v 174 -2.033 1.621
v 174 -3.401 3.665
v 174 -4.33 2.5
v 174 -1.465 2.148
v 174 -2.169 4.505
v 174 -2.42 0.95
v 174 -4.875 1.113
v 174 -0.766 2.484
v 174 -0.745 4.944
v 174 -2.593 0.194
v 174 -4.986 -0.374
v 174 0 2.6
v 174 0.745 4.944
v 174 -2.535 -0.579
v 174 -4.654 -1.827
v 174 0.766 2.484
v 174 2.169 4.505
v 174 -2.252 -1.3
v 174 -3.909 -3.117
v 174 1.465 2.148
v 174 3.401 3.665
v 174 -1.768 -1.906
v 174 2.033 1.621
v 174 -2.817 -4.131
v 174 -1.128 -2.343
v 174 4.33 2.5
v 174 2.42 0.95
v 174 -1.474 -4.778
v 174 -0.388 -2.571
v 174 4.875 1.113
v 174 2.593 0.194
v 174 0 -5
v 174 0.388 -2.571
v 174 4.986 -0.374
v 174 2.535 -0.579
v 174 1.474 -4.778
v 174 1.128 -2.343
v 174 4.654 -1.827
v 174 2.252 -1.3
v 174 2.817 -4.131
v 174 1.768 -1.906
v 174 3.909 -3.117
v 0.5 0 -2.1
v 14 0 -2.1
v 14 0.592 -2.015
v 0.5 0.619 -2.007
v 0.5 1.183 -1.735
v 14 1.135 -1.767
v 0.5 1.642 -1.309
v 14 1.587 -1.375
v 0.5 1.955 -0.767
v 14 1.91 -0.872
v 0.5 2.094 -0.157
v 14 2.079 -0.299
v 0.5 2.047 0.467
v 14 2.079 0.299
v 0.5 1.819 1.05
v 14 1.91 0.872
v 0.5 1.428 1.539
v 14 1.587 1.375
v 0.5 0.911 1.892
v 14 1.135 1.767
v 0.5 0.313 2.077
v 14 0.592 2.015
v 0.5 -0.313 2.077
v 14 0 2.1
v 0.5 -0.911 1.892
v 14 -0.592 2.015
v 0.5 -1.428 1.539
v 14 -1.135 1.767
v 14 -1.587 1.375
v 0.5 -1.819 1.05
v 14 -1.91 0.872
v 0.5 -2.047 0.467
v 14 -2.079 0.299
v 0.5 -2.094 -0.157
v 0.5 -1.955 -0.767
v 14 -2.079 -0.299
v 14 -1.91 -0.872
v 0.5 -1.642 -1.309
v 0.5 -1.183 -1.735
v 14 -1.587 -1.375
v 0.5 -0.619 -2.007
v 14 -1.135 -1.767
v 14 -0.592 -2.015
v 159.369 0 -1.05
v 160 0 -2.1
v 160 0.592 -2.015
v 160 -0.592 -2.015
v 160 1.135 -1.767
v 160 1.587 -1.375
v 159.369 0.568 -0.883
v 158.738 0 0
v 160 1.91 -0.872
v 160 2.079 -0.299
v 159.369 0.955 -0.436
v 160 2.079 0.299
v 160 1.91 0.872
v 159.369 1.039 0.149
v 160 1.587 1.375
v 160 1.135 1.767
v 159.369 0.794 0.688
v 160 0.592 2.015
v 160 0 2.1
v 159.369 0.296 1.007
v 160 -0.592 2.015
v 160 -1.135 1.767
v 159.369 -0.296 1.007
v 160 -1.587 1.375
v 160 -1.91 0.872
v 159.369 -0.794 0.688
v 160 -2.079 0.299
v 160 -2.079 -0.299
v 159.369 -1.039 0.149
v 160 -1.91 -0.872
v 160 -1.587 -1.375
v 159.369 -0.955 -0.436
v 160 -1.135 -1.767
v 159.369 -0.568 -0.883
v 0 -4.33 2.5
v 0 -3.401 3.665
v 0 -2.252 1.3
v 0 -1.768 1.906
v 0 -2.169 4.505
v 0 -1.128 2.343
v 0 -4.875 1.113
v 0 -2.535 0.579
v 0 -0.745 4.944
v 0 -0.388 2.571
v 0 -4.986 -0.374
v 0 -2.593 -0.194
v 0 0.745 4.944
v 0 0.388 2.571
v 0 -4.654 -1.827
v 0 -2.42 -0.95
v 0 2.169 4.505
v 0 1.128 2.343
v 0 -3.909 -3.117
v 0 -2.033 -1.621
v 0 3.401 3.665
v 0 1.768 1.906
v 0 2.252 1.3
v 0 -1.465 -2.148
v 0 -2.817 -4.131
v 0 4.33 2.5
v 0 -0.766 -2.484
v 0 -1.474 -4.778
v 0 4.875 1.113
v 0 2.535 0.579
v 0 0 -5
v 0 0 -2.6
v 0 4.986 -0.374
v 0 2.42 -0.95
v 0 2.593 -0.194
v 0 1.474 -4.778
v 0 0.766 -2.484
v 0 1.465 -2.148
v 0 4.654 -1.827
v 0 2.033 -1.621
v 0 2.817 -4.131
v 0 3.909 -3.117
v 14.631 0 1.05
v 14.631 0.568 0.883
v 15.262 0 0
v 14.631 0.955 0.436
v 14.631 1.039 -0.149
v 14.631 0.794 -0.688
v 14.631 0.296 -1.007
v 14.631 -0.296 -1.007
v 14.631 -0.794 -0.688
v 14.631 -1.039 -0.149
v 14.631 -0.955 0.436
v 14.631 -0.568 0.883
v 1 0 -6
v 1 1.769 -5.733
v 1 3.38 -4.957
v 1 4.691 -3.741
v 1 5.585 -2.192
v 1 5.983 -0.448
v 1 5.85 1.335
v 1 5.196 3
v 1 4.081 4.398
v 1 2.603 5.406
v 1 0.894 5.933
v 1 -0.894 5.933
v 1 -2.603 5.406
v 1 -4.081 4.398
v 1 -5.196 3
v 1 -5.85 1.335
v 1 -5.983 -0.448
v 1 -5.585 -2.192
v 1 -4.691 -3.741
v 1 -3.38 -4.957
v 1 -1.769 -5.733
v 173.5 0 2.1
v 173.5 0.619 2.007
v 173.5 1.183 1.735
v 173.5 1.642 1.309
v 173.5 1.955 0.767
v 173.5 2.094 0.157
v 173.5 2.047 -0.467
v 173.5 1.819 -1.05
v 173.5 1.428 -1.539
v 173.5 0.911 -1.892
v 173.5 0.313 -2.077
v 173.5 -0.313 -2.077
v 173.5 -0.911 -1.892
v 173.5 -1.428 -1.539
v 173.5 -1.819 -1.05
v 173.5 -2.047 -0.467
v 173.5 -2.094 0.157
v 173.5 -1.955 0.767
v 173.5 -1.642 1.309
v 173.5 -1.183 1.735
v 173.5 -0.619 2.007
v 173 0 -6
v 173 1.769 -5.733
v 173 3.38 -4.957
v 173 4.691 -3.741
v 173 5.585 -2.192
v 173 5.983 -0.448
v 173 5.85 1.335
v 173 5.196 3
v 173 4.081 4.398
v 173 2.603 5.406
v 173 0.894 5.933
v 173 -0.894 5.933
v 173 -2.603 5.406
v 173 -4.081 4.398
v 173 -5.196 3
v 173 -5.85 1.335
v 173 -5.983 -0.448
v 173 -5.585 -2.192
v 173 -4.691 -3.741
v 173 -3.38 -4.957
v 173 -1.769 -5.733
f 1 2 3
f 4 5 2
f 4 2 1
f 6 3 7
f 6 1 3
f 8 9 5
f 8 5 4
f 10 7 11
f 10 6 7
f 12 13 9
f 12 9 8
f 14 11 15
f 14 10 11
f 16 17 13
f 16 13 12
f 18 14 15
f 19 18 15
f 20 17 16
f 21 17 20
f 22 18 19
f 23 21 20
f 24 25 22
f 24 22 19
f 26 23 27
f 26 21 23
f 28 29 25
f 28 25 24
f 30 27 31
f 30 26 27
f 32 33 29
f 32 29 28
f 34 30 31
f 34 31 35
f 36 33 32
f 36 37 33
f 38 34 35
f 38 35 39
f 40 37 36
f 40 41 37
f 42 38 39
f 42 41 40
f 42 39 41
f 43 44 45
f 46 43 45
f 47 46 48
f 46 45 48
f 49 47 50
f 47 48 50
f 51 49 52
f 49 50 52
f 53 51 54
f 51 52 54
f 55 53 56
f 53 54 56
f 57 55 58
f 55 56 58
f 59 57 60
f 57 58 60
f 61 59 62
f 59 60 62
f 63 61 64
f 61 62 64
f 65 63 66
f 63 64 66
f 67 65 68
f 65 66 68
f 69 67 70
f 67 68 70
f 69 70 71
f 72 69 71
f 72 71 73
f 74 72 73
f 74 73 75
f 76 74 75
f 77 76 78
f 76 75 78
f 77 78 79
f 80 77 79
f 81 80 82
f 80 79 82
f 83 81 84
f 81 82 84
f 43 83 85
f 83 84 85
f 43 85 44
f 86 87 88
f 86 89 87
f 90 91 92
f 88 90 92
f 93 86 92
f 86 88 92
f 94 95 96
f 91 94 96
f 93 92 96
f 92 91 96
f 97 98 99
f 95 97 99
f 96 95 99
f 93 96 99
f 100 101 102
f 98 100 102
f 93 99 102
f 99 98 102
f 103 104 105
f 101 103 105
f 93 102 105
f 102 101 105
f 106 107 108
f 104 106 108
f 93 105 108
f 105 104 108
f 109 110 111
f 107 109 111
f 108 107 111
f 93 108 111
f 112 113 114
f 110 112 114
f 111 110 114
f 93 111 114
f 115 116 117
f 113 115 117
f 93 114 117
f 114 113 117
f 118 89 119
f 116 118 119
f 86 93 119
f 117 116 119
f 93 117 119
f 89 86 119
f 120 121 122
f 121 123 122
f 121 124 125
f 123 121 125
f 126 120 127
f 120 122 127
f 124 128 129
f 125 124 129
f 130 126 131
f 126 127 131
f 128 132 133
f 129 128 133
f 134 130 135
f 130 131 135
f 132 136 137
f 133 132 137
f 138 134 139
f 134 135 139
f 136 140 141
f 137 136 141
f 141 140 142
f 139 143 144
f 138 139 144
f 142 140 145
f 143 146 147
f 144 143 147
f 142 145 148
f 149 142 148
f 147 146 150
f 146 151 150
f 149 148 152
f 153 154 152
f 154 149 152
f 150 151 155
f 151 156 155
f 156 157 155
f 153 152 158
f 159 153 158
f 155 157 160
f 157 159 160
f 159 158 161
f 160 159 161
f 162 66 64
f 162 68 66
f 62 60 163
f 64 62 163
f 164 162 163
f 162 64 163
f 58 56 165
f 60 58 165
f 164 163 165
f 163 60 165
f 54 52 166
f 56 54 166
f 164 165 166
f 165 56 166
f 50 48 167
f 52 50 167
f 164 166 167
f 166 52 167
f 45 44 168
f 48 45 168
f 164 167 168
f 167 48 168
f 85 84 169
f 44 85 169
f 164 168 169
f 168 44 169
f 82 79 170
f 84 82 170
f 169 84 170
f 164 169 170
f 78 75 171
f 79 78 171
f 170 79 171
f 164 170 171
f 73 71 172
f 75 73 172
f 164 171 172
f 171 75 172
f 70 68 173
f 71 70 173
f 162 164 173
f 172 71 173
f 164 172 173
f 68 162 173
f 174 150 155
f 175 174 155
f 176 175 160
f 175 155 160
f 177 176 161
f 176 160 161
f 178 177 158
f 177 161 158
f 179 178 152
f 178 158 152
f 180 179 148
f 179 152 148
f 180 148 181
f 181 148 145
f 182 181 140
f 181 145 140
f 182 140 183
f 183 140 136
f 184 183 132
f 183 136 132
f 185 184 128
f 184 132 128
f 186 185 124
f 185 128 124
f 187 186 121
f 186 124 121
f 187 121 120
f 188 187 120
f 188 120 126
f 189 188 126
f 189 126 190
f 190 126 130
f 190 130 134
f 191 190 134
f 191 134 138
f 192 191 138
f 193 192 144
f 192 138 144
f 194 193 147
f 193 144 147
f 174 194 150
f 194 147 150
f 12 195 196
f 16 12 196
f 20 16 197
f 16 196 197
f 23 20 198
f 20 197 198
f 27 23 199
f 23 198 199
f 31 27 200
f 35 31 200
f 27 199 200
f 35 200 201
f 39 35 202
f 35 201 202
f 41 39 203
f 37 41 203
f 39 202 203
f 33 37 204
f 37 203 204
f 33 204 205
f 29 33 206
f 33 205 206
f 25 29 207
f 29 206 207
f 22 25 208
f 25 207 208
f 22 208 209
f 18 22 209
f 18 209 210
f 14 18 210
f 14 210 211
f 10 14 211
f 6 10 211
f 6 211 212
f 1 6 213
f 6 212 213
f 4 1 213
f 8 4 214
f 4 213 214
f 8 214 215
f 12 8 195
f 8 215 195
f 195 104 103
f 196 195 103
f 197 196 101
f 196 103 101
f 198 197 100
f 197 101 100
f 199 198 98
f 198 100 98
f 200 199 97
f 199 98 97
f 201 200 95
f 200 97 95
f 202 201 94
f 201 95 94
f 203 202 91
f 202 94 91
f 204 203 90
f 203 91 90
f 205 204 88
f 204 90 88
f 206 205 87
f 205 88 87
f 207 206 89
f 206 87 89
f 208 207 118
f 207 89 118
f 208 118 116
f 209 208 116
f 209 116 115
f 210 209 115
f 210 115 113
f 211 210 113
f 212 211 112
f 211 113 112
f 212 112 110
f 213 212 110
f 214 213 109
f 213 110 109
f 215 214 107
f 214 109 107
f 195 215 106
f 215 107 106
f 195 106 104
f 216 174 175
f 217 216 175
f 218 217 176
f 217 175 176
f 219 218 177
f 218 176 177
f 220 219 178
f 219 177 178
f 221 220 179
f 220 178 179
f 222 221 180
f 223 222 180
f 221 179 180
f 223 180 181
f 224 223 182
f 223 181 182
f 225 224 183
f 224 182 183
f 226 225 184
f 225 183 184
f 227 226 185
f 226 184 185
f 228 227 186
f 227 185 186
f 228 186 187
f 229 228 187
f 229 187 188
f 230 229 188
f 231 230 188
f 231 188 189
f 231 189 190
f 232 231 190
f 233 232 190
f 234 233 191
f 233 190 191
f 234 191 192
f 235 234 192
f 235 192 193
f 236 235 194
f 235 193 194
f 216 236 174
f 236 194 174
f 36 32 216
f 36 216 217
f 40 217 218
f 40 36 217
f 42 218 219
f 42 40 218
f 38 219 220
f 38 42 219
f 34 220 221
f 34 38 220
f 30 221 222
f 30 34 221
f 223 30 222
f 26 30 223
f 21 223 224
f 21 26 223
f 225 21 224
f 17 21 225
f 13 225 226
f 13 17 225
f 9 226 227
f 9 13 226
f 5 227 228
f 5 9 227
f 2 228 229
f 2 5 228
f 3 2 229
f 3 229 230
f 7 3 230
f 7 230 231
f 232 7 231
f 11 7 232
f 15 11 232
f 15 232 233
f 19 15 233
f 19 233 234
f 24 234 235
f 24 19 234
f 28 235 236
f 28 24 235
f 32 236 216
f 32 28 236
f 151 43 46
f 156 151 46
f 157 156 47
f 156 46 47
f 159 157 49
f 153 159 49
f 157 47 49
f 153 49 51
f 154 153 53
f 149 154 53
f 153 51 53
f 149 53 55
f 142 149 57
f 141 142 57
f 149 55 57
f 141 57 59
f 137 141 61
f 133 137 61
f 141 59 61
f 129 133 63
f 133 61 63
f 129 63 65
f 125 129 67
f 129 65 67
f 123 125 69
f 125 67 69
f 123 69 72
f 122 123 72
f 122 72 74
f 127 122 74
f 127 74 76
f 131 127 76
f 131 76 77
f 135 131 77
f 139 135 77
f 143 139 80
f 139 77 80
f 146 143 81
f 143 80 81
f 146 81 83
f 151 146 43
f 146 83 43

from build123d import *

# Parameters (mm, degrees)
SKETCH1_R             = 6
BOSS_EXTRUDE1_DEPTH   = 174
CHAMFER1_SIZE         = 1
M5_TAPPED_HOLE1_D     = 4.2
M5_TAPPED_HOLE1_DEPTH = 14
M5_TAPPED_HOLE1_TIP   = 1.2618073
CHAMFER2_SIZE         = 0.5
M5_TAPPED_HOLE2_D     = 4.2
M5_TAPPED_HOLE2_DEPTH = 14
M5_TAPPED_HOLE2_TIP   = 1.2618073
CHAMFER3_SIZE         = 0.5


with BuildPart() as part:
    # Sketch1 → Boss-Extrude1 (new body)
    with BuildSketch(Plane(origin=(0, 0, 0), x_dir=(0, 0, -1), z_dir=(1, 0, 0))):
        Circle(SKETCH1_R)
    extrude(amount=BOSS_EXTRUDE1_DEPTH)

    # Chamfer1
    chamfer1_edges = [part.edges().sort_by_distance(p)[0] for p in [
        (0, 0, 6),
        (174, 0, 6),
    ]]
    chamfer(chamfer1_edges, length=CHAMFER1_SIZE)

    # M5 Tapped Hole1
    with Locations(Plane(origin=(174, 0, 0), x_dir=(0, 0, -1), z_dir=(1, 0, 0))):
        with Locations((0, 0)):
            Hole(M5_TAPPED_HOLE1_D / 2, depth=M5_TAPPED_HOLE1_DEPTH)
            with Locations((0, 0, -(M5_TAPPED_HOLE1_DEPTH + M5_TAPPED_HOLE1_TIP / 2))):  # 118° drill point
                Cone(0, M5_TAPPED_HOLE1_D / 2, M5_TAPPED_HOLE1_TIP, mode=Mode.SUBTRACT)

    # Chamfer2
    chamfer2_edges = [part.edges().sort_by_distance(p)[0] for p in [
        (174, 0, -2.1),
    ]]
    chamfer(chamfer2_edges, length=CHAMFER2_SIZE)

    # M5 Tapped Hole2
    with Locations(Plane.ZY):
        with Locations((0, 0)):
            Hole(M5_TAPPED_HOLE2_D / 2, depth=M5_TAPPED_HOLE2_DEPTH)
            with Locations((0, 0, -(M5_TAPPED_HOLE2_DEPTH + M5_TAPPED_HOLE2_TIP / 2))):  # 118° drill point
                Cone(0, M5_TAPPED_HOLE2_D / 2, M5_TAPPED_HOLE2_TIP, mode=Mode.SUBTRACT)

    # Chamfer3
    chamfer3_edges = [part.edges().sort_by_distance(p)[0] for p in [
        (0, 0, 2.1),
    ]]
    chamfer(chamfer3_edges, length=CHAMFER3_SIZE)


solid = part.part
